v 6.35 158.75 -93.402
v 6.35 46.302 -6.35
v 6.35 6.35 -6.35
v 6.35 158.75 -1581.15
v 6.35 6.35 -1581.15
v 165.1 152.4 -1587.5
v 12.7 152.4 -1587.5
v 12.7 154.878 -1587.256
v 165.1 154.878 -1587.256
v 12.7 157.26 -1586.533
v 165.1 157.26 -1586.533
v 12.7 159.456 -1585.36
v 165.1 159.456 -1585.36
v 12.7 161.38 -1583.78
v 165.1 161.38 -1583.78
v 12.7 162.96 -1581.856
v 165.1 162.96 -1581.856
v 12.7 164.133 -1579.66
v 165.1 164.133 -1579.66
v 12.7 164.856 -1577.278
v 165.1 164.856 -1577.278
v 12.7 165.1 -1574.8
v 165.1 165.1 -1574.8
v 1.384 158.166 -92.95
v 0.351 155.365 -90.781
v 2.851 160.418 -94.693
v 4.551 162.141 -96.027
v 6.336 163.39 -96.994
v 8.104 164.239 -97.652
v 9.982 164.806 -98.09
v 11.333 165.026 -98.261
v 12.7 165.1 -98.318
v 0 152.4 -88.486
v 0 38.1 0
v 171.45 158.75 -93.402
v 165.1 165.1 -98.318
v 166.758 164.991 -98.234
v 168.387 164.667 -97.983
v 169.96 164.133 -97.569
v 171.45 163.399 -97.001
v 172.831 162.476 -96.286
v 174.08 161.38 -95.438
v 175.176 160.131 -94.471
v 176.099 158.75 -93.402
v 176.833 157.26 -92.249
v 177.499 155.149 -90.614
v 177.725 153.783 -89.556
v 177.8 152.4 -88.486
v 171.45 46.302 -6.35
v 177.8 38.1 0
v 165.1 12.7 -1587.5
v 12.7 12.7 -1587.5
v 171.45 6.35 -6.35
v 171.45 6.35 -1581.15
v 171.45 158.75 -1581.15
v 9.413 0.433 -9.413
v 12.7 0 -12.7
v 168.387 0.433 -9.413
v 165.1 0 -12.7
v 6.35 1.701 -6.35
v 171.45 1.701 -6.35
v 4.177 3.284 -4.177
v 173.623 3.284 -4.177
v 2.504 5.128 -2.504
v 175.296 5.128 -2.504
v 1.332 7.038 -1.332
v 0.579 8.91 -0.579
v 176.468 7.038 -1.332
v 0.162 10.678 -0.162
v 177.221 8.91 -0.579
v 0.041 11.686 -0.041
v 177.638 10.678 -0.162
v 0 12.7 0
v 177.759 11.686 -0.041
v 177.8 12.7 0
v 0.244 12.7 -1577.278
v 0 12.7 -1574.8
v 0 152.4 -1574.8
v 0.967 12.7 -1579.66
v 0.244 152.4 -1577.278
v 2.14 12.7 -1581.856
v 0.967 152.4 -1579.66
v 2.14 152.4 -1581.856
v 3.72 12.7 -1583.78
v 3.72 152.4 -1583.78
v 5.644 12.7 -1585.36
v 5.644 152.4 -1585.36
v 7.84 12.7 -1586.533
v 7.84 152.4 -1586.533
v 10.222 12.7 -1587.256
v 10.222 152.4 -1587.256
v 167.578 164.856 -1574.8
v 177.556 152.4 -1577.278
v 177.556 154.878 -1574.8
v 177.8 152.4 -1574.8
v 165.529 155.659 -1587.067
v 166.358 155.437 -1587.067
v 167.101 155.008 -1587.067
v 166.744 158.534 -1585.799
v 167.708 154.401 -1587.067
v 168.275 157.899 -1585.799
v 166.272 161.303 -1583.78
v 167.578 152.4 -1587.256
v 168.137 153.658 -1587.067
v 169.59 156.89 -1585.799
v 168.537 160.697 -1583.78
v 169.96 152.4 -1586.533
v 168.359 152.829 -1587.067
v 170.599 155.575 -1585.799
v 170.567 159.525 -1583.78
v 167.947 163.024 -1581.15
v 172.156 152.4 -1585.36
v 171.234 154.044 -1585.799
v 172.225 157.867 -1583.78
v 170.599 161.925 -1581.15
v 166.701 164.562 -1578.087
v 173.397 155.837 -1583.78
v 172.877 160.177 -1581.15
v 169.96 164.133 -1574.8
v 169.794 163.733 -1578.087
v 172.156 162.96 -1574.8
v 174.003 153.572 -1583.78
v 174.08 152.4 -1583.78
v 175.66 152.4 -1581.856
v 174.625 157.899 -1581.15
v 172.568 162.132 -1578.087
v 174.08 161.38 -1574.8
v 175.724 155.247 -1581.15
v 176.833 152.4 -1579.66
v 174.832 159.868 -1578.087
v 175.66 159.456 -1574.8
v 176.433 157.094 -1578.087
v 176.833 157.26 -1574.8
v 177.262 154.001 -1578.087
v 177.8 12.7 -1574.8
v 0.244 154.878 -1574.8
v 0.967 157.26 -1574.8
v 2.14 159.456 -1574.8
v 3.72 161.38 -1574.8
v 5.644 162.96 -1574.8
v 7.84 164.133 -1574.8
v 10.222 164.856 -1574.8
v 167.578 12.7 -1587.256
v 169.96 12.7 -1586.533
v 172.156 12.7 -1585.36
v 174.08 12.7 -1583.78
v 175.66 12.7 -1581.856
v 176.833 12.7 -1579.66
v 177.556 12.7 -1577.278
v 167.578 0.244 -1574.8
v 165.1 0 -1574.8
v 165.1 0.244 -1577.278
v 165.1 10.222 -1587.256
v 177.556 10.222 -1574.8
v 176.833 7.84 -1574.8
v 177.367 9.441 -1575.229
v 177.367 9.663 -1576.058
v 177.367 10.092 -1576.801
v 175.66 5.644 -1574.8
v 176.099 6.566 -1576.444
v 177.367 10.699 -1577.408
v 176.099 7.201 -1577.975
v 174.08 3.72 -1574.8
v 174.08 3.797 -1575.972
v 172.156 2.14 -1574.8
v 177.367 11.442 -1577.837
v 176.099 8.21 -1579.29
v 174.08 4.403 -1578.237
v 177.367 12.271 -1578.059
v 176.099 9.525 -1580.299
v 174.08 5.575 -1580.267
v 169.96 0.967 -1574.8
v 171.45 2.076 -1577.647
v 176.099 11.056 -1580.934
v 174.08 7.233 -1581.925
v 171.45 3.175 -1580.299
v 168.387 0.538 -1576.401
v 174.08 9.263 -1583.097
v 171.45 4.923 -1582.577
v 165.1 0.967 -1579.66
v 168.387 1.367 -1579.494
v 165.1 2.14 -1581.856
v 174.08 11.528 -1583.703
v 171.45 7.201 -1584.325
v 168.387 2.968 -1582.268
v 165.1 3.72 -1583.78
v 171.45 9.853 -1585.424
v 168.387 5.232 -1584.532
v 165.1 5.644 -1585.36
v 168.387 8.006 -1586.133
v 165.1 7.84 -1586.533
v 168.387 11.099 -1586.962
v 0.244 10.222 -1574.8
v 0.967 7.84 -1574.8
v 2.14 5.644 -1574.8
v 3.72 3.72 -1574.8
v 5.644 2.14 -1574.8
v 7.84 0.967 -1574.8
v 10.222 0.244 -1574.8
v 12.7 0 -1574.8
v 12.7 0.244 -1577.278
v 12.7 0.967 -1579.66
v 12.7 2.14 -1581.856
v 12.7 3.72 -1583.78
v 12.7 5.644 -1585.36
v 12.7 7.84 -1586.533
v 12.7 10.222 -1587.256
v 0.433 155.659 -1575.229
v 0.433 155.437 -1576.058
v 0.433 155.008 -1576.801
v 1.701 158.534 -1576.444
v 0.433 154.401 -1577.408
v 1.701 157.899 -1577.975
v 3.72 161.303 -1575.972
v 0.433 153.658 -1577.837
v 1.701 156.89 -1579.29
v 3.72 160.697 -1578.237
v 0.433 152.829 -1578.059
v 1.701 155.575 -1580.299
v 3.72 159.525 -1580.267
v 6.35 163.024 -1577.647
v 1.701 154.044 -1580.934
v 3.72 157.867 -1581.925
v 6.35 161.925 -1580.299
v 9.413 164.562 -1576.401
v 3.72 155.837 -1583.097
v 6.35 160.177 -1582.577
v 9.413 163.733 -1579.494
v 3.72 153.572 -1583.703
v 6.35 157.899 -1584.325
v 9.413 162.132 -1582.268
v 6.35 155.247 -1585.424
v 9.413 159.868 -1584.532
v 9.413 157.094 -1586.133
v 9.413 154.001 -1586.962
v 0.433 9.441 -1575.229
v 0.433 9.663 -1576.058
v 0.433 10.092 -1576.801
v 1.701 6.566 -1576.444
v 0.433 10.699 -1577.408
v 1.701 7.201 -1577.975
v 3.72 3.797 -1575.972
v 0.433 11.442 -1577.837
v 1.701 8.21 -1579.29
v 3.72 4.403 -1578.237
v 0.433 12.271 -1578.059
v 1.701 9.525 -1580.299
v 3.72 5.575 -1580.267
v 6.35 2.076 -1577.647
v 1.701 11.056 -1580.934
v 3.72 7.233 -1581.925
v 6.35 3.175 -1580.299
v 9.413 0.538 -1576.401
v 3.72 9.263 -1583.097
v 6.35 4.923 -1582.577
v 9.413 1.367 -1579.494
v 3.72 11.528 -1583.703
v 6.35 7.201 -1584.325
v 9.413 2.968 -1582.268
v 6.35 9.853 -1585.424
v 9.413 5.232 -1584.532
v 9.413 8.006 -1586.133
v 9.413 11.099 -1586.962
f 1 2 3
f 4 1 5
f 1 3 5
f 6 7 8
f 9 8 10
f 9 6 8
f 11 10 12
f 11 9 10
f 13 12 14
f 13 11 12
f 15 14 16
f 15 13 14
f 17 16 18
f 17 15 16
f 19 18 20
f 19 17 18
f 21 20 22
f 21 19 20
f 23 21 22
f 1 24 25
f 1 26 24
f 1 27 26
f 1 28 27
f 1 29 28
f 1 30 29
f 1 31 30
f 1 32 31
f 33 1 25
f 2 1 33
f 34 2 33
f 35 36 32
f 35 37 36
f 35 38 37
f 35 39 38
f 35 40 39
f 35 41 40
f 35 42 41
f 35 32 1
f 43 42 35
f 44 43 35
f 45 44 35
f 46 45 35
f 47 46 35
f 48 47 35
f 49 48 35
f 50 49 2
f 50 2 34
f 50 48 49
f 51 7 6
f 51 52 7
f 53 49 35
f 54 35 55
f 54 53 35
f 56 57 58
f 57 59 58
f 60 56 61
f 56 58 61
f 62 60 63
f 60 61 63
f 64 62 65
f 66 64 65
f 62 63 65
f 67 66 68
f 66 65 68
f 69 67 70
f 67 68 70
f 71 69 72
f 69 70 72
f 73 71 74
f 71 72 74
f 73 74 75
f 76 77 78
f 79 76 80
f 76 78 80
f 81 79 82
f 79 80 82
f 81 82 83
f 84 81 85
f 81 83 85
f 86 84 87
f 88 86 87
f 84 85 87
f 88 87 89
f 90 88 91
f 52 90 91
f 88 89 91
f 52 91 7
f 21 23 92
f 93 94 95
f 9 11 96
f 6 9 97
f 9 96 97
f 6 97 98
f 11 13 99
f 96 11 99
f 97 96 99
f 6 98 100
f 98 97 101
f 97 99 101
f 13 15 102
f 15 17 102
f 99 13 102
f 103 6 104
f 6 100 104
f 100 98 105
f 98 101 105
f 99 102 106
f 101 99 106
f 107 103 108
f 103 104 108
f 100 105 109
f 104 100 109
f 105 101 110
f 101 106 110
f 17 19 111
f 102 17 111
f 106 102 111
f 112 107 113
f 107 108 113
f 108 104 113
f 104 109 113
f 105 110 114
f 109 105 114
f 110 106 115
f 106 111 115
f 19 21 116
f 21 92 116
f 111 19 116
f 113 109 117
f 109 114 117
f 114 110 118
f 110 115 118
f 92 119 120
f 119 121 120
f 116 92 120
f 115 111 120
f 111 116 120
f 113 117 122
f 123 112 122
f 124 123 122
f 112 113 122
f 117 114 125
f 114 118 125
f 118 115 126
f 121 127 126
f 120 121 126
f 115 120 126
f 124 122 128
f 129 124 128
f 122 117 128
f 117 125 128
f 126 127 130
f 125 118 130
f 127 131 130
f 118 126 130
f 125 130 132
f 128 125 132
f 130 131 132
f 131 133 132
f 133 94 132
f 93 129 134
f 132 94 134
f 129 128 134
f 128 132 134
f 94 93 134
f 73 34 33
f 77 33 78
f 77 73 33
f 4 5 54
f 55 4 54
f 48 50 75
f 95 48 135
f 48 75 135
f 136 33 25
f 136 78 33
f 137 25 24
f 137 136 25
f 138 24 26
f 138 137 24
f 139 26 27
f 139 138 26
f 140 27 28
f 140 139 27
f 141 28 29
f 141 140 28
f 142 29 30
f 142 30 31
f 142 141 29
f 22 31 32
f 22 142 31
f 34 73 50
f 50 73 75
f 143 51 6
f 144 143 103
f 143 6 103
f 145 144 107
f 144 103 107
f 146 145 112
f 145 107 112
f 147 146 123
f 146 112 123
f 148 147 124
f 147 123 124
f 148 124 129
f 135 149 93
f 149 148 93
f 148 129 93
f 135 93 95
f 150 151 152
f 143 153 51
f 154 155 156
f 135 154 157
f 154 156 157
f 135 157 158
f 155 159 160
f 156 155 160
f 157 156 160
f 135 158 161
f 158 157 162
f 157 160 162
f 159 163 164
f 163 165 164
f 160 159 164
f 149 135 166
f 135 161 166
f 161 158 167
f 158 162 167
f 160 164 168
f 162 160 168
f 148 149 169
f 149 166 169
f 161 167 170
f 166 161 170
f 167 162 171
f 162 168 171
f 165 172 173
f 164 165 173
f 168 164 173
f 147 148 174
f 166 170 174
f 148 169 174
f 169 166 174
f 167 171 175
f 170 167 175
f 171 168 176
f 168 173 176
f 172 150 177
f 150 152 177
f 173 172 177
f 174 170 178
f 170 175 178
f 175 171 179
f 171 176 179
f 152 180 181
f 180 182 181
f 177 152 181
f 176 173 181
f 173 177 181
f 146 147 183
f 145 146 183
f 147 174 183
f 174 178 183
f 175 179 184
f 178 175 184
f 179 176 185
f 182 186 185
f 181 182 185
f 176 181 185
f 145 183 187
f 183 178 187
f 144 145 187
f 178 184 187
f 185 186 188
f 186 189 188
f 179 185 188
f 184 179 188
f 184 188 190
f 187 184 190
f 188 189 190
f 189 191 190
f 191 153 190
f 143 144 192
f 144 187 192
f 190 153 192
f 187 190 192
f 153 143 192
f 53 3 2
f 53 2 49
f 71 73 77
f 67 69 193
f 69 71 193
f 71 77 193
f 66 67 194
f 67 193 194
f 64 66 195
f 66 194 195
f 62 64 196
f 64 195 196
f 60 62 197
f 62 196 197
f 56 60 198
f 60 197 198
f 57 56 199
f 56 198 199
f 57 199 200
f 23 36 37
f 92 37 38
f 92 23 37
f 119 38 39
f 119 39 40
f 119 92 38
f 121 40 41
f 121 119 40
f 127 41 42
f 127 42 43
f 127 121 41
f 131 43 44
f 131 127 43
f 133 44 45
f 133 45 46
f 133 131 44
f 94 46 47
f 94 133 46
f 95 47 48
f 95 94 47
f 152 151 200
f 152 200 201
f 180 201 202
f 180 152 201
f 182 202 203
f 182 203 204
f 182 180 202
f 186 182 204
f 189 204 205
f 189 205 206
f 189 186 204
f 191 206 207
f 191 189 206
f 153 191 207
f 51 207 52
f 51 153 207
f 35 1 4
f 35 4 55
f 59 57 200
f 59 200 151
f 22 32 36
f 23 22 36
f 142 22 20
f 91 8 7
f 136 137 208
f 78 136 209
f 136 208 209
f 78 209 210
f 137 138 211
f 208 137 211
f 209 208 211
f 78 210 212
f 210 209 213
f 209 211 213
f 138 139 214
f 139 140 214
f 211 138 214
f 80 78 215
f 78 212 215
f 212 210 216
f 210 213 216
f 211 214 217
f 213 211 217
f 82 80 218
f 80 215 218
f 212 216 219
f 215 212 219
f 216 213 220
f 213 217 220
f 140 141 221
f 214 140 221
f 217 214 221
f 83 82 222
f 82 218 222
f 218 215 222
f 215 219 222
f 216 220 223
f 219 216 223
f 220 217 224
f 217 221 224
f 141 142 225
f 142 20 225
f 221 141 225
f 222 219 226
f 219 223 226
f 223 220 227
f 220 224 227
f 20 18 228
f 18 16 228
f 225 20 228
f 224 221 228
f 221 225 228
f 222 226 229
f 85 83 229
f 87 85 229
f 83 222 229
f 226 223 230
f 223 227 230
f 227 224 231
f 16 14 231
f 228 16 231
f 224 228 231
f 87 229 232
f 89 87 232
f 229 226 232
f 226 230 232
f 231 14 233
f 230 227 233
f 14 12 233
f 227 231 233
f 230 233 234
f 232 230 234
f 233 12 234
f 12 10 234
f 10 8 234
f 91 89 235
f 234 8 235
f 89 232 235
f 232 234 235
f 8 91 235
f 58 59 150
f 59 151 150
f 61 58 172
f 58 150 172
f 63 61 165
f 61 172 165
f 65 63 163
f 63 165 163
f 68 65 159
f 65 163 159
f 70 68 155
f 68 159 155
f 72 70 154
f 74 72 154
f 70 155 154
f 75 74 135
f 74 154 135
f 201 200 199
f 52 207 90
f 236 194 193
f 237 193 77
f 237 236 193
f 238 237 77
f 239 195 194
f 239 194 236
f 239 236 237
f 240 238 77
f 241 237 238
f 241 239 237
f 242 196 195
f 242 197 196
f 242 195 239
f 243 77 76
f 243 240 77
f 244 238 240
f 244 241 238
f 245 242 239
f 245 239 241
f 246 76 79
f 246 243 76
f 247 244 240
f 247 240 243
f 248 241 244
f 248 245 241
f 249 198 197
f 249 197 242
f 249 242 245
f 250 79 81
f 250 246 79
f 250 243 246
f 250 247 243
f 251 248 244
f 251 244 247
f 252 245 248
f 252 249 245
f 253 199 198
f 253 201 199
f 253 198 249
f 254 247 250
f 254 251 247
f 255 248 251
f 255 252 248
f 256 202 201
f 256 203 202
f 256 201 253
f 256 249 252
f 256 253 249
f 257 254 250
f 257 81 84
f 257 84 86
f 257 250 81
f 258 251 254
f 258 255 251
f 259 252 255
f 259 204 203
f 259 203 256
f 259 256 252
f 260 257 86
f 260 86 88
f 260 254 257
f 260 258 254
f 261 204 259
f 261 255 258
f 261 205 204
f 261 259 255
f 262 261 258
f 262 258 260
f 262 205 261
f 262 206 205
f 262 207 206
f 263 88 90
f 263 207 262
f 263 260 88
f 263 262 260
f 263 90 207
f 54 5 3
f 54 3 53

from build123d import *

# Parameters (mm, degrees)
SKETCH1_W           = 177.8
SKETCH1_H           = 1587.5
BOSS_EXTRUDE1_DEPTH = 165.1
CUT_EXTRUDE1_DEPTH  = 177.8
SHELL2_T            = -6.35
FILLET3_R           = 12.7


with BuildPart() as part:
    # Sketch1 → Boss-Extrude1 (new body)
    with BuildSketch(Plane(origin=(0, 0, 0), x_dir=(1, 0, 0), z_dir=(0, 1, 0))):
        with Locations((88.9, 793.75)):
            Rectangle(SKETCH1_W, SKETCH1_H)
    extrude(amount=BOSS_EXTRUDE1_DEPTH)

    # Sketch2 → Cut-Extrude1 (cut)
    with BuildSketch(Plane(origin=(177.8, 0, 0), x_dir=(0, 0, -1), z_dir=(1, 0, 0))):
        Polygon((0, 165.1), (98.317886998, 165.1), (0, 38.1), align=None)
    extrude(amount=-CUT_EXTRUDE1_DEPTH, mode=Mode.SUBTRACT)

    # Shell2
    shell2_openings = [part.faces().sort_by_distance(p)[0] for p in [
        (88.9, 101.6, -49.158943499),
    ]]
    offset(amount=SHELL2_T, openings=shell2_openings, kind=Kind.INTERSECTION)

    # Fillet3
    fillet3_edges = [part.edges().sort_by_distance(p)[0] for p in [
        (177.8, 165.1, -842.908943499),
        (88.9, 165.1, -1587.5),
        (0, 165.1, -842.908943499),
        (88.9, 0, -1587.5),
        (177.8, 0, -793.75),
        (88.9, 0, 0),
        (0, 0, -793.75),
        (0, 82.55, -1587.5),
        (177.8, 82.55, -1587.5),
    ]]
    fillet(fillet3_edges, radius=FILLET3_R)


solid = part.part
